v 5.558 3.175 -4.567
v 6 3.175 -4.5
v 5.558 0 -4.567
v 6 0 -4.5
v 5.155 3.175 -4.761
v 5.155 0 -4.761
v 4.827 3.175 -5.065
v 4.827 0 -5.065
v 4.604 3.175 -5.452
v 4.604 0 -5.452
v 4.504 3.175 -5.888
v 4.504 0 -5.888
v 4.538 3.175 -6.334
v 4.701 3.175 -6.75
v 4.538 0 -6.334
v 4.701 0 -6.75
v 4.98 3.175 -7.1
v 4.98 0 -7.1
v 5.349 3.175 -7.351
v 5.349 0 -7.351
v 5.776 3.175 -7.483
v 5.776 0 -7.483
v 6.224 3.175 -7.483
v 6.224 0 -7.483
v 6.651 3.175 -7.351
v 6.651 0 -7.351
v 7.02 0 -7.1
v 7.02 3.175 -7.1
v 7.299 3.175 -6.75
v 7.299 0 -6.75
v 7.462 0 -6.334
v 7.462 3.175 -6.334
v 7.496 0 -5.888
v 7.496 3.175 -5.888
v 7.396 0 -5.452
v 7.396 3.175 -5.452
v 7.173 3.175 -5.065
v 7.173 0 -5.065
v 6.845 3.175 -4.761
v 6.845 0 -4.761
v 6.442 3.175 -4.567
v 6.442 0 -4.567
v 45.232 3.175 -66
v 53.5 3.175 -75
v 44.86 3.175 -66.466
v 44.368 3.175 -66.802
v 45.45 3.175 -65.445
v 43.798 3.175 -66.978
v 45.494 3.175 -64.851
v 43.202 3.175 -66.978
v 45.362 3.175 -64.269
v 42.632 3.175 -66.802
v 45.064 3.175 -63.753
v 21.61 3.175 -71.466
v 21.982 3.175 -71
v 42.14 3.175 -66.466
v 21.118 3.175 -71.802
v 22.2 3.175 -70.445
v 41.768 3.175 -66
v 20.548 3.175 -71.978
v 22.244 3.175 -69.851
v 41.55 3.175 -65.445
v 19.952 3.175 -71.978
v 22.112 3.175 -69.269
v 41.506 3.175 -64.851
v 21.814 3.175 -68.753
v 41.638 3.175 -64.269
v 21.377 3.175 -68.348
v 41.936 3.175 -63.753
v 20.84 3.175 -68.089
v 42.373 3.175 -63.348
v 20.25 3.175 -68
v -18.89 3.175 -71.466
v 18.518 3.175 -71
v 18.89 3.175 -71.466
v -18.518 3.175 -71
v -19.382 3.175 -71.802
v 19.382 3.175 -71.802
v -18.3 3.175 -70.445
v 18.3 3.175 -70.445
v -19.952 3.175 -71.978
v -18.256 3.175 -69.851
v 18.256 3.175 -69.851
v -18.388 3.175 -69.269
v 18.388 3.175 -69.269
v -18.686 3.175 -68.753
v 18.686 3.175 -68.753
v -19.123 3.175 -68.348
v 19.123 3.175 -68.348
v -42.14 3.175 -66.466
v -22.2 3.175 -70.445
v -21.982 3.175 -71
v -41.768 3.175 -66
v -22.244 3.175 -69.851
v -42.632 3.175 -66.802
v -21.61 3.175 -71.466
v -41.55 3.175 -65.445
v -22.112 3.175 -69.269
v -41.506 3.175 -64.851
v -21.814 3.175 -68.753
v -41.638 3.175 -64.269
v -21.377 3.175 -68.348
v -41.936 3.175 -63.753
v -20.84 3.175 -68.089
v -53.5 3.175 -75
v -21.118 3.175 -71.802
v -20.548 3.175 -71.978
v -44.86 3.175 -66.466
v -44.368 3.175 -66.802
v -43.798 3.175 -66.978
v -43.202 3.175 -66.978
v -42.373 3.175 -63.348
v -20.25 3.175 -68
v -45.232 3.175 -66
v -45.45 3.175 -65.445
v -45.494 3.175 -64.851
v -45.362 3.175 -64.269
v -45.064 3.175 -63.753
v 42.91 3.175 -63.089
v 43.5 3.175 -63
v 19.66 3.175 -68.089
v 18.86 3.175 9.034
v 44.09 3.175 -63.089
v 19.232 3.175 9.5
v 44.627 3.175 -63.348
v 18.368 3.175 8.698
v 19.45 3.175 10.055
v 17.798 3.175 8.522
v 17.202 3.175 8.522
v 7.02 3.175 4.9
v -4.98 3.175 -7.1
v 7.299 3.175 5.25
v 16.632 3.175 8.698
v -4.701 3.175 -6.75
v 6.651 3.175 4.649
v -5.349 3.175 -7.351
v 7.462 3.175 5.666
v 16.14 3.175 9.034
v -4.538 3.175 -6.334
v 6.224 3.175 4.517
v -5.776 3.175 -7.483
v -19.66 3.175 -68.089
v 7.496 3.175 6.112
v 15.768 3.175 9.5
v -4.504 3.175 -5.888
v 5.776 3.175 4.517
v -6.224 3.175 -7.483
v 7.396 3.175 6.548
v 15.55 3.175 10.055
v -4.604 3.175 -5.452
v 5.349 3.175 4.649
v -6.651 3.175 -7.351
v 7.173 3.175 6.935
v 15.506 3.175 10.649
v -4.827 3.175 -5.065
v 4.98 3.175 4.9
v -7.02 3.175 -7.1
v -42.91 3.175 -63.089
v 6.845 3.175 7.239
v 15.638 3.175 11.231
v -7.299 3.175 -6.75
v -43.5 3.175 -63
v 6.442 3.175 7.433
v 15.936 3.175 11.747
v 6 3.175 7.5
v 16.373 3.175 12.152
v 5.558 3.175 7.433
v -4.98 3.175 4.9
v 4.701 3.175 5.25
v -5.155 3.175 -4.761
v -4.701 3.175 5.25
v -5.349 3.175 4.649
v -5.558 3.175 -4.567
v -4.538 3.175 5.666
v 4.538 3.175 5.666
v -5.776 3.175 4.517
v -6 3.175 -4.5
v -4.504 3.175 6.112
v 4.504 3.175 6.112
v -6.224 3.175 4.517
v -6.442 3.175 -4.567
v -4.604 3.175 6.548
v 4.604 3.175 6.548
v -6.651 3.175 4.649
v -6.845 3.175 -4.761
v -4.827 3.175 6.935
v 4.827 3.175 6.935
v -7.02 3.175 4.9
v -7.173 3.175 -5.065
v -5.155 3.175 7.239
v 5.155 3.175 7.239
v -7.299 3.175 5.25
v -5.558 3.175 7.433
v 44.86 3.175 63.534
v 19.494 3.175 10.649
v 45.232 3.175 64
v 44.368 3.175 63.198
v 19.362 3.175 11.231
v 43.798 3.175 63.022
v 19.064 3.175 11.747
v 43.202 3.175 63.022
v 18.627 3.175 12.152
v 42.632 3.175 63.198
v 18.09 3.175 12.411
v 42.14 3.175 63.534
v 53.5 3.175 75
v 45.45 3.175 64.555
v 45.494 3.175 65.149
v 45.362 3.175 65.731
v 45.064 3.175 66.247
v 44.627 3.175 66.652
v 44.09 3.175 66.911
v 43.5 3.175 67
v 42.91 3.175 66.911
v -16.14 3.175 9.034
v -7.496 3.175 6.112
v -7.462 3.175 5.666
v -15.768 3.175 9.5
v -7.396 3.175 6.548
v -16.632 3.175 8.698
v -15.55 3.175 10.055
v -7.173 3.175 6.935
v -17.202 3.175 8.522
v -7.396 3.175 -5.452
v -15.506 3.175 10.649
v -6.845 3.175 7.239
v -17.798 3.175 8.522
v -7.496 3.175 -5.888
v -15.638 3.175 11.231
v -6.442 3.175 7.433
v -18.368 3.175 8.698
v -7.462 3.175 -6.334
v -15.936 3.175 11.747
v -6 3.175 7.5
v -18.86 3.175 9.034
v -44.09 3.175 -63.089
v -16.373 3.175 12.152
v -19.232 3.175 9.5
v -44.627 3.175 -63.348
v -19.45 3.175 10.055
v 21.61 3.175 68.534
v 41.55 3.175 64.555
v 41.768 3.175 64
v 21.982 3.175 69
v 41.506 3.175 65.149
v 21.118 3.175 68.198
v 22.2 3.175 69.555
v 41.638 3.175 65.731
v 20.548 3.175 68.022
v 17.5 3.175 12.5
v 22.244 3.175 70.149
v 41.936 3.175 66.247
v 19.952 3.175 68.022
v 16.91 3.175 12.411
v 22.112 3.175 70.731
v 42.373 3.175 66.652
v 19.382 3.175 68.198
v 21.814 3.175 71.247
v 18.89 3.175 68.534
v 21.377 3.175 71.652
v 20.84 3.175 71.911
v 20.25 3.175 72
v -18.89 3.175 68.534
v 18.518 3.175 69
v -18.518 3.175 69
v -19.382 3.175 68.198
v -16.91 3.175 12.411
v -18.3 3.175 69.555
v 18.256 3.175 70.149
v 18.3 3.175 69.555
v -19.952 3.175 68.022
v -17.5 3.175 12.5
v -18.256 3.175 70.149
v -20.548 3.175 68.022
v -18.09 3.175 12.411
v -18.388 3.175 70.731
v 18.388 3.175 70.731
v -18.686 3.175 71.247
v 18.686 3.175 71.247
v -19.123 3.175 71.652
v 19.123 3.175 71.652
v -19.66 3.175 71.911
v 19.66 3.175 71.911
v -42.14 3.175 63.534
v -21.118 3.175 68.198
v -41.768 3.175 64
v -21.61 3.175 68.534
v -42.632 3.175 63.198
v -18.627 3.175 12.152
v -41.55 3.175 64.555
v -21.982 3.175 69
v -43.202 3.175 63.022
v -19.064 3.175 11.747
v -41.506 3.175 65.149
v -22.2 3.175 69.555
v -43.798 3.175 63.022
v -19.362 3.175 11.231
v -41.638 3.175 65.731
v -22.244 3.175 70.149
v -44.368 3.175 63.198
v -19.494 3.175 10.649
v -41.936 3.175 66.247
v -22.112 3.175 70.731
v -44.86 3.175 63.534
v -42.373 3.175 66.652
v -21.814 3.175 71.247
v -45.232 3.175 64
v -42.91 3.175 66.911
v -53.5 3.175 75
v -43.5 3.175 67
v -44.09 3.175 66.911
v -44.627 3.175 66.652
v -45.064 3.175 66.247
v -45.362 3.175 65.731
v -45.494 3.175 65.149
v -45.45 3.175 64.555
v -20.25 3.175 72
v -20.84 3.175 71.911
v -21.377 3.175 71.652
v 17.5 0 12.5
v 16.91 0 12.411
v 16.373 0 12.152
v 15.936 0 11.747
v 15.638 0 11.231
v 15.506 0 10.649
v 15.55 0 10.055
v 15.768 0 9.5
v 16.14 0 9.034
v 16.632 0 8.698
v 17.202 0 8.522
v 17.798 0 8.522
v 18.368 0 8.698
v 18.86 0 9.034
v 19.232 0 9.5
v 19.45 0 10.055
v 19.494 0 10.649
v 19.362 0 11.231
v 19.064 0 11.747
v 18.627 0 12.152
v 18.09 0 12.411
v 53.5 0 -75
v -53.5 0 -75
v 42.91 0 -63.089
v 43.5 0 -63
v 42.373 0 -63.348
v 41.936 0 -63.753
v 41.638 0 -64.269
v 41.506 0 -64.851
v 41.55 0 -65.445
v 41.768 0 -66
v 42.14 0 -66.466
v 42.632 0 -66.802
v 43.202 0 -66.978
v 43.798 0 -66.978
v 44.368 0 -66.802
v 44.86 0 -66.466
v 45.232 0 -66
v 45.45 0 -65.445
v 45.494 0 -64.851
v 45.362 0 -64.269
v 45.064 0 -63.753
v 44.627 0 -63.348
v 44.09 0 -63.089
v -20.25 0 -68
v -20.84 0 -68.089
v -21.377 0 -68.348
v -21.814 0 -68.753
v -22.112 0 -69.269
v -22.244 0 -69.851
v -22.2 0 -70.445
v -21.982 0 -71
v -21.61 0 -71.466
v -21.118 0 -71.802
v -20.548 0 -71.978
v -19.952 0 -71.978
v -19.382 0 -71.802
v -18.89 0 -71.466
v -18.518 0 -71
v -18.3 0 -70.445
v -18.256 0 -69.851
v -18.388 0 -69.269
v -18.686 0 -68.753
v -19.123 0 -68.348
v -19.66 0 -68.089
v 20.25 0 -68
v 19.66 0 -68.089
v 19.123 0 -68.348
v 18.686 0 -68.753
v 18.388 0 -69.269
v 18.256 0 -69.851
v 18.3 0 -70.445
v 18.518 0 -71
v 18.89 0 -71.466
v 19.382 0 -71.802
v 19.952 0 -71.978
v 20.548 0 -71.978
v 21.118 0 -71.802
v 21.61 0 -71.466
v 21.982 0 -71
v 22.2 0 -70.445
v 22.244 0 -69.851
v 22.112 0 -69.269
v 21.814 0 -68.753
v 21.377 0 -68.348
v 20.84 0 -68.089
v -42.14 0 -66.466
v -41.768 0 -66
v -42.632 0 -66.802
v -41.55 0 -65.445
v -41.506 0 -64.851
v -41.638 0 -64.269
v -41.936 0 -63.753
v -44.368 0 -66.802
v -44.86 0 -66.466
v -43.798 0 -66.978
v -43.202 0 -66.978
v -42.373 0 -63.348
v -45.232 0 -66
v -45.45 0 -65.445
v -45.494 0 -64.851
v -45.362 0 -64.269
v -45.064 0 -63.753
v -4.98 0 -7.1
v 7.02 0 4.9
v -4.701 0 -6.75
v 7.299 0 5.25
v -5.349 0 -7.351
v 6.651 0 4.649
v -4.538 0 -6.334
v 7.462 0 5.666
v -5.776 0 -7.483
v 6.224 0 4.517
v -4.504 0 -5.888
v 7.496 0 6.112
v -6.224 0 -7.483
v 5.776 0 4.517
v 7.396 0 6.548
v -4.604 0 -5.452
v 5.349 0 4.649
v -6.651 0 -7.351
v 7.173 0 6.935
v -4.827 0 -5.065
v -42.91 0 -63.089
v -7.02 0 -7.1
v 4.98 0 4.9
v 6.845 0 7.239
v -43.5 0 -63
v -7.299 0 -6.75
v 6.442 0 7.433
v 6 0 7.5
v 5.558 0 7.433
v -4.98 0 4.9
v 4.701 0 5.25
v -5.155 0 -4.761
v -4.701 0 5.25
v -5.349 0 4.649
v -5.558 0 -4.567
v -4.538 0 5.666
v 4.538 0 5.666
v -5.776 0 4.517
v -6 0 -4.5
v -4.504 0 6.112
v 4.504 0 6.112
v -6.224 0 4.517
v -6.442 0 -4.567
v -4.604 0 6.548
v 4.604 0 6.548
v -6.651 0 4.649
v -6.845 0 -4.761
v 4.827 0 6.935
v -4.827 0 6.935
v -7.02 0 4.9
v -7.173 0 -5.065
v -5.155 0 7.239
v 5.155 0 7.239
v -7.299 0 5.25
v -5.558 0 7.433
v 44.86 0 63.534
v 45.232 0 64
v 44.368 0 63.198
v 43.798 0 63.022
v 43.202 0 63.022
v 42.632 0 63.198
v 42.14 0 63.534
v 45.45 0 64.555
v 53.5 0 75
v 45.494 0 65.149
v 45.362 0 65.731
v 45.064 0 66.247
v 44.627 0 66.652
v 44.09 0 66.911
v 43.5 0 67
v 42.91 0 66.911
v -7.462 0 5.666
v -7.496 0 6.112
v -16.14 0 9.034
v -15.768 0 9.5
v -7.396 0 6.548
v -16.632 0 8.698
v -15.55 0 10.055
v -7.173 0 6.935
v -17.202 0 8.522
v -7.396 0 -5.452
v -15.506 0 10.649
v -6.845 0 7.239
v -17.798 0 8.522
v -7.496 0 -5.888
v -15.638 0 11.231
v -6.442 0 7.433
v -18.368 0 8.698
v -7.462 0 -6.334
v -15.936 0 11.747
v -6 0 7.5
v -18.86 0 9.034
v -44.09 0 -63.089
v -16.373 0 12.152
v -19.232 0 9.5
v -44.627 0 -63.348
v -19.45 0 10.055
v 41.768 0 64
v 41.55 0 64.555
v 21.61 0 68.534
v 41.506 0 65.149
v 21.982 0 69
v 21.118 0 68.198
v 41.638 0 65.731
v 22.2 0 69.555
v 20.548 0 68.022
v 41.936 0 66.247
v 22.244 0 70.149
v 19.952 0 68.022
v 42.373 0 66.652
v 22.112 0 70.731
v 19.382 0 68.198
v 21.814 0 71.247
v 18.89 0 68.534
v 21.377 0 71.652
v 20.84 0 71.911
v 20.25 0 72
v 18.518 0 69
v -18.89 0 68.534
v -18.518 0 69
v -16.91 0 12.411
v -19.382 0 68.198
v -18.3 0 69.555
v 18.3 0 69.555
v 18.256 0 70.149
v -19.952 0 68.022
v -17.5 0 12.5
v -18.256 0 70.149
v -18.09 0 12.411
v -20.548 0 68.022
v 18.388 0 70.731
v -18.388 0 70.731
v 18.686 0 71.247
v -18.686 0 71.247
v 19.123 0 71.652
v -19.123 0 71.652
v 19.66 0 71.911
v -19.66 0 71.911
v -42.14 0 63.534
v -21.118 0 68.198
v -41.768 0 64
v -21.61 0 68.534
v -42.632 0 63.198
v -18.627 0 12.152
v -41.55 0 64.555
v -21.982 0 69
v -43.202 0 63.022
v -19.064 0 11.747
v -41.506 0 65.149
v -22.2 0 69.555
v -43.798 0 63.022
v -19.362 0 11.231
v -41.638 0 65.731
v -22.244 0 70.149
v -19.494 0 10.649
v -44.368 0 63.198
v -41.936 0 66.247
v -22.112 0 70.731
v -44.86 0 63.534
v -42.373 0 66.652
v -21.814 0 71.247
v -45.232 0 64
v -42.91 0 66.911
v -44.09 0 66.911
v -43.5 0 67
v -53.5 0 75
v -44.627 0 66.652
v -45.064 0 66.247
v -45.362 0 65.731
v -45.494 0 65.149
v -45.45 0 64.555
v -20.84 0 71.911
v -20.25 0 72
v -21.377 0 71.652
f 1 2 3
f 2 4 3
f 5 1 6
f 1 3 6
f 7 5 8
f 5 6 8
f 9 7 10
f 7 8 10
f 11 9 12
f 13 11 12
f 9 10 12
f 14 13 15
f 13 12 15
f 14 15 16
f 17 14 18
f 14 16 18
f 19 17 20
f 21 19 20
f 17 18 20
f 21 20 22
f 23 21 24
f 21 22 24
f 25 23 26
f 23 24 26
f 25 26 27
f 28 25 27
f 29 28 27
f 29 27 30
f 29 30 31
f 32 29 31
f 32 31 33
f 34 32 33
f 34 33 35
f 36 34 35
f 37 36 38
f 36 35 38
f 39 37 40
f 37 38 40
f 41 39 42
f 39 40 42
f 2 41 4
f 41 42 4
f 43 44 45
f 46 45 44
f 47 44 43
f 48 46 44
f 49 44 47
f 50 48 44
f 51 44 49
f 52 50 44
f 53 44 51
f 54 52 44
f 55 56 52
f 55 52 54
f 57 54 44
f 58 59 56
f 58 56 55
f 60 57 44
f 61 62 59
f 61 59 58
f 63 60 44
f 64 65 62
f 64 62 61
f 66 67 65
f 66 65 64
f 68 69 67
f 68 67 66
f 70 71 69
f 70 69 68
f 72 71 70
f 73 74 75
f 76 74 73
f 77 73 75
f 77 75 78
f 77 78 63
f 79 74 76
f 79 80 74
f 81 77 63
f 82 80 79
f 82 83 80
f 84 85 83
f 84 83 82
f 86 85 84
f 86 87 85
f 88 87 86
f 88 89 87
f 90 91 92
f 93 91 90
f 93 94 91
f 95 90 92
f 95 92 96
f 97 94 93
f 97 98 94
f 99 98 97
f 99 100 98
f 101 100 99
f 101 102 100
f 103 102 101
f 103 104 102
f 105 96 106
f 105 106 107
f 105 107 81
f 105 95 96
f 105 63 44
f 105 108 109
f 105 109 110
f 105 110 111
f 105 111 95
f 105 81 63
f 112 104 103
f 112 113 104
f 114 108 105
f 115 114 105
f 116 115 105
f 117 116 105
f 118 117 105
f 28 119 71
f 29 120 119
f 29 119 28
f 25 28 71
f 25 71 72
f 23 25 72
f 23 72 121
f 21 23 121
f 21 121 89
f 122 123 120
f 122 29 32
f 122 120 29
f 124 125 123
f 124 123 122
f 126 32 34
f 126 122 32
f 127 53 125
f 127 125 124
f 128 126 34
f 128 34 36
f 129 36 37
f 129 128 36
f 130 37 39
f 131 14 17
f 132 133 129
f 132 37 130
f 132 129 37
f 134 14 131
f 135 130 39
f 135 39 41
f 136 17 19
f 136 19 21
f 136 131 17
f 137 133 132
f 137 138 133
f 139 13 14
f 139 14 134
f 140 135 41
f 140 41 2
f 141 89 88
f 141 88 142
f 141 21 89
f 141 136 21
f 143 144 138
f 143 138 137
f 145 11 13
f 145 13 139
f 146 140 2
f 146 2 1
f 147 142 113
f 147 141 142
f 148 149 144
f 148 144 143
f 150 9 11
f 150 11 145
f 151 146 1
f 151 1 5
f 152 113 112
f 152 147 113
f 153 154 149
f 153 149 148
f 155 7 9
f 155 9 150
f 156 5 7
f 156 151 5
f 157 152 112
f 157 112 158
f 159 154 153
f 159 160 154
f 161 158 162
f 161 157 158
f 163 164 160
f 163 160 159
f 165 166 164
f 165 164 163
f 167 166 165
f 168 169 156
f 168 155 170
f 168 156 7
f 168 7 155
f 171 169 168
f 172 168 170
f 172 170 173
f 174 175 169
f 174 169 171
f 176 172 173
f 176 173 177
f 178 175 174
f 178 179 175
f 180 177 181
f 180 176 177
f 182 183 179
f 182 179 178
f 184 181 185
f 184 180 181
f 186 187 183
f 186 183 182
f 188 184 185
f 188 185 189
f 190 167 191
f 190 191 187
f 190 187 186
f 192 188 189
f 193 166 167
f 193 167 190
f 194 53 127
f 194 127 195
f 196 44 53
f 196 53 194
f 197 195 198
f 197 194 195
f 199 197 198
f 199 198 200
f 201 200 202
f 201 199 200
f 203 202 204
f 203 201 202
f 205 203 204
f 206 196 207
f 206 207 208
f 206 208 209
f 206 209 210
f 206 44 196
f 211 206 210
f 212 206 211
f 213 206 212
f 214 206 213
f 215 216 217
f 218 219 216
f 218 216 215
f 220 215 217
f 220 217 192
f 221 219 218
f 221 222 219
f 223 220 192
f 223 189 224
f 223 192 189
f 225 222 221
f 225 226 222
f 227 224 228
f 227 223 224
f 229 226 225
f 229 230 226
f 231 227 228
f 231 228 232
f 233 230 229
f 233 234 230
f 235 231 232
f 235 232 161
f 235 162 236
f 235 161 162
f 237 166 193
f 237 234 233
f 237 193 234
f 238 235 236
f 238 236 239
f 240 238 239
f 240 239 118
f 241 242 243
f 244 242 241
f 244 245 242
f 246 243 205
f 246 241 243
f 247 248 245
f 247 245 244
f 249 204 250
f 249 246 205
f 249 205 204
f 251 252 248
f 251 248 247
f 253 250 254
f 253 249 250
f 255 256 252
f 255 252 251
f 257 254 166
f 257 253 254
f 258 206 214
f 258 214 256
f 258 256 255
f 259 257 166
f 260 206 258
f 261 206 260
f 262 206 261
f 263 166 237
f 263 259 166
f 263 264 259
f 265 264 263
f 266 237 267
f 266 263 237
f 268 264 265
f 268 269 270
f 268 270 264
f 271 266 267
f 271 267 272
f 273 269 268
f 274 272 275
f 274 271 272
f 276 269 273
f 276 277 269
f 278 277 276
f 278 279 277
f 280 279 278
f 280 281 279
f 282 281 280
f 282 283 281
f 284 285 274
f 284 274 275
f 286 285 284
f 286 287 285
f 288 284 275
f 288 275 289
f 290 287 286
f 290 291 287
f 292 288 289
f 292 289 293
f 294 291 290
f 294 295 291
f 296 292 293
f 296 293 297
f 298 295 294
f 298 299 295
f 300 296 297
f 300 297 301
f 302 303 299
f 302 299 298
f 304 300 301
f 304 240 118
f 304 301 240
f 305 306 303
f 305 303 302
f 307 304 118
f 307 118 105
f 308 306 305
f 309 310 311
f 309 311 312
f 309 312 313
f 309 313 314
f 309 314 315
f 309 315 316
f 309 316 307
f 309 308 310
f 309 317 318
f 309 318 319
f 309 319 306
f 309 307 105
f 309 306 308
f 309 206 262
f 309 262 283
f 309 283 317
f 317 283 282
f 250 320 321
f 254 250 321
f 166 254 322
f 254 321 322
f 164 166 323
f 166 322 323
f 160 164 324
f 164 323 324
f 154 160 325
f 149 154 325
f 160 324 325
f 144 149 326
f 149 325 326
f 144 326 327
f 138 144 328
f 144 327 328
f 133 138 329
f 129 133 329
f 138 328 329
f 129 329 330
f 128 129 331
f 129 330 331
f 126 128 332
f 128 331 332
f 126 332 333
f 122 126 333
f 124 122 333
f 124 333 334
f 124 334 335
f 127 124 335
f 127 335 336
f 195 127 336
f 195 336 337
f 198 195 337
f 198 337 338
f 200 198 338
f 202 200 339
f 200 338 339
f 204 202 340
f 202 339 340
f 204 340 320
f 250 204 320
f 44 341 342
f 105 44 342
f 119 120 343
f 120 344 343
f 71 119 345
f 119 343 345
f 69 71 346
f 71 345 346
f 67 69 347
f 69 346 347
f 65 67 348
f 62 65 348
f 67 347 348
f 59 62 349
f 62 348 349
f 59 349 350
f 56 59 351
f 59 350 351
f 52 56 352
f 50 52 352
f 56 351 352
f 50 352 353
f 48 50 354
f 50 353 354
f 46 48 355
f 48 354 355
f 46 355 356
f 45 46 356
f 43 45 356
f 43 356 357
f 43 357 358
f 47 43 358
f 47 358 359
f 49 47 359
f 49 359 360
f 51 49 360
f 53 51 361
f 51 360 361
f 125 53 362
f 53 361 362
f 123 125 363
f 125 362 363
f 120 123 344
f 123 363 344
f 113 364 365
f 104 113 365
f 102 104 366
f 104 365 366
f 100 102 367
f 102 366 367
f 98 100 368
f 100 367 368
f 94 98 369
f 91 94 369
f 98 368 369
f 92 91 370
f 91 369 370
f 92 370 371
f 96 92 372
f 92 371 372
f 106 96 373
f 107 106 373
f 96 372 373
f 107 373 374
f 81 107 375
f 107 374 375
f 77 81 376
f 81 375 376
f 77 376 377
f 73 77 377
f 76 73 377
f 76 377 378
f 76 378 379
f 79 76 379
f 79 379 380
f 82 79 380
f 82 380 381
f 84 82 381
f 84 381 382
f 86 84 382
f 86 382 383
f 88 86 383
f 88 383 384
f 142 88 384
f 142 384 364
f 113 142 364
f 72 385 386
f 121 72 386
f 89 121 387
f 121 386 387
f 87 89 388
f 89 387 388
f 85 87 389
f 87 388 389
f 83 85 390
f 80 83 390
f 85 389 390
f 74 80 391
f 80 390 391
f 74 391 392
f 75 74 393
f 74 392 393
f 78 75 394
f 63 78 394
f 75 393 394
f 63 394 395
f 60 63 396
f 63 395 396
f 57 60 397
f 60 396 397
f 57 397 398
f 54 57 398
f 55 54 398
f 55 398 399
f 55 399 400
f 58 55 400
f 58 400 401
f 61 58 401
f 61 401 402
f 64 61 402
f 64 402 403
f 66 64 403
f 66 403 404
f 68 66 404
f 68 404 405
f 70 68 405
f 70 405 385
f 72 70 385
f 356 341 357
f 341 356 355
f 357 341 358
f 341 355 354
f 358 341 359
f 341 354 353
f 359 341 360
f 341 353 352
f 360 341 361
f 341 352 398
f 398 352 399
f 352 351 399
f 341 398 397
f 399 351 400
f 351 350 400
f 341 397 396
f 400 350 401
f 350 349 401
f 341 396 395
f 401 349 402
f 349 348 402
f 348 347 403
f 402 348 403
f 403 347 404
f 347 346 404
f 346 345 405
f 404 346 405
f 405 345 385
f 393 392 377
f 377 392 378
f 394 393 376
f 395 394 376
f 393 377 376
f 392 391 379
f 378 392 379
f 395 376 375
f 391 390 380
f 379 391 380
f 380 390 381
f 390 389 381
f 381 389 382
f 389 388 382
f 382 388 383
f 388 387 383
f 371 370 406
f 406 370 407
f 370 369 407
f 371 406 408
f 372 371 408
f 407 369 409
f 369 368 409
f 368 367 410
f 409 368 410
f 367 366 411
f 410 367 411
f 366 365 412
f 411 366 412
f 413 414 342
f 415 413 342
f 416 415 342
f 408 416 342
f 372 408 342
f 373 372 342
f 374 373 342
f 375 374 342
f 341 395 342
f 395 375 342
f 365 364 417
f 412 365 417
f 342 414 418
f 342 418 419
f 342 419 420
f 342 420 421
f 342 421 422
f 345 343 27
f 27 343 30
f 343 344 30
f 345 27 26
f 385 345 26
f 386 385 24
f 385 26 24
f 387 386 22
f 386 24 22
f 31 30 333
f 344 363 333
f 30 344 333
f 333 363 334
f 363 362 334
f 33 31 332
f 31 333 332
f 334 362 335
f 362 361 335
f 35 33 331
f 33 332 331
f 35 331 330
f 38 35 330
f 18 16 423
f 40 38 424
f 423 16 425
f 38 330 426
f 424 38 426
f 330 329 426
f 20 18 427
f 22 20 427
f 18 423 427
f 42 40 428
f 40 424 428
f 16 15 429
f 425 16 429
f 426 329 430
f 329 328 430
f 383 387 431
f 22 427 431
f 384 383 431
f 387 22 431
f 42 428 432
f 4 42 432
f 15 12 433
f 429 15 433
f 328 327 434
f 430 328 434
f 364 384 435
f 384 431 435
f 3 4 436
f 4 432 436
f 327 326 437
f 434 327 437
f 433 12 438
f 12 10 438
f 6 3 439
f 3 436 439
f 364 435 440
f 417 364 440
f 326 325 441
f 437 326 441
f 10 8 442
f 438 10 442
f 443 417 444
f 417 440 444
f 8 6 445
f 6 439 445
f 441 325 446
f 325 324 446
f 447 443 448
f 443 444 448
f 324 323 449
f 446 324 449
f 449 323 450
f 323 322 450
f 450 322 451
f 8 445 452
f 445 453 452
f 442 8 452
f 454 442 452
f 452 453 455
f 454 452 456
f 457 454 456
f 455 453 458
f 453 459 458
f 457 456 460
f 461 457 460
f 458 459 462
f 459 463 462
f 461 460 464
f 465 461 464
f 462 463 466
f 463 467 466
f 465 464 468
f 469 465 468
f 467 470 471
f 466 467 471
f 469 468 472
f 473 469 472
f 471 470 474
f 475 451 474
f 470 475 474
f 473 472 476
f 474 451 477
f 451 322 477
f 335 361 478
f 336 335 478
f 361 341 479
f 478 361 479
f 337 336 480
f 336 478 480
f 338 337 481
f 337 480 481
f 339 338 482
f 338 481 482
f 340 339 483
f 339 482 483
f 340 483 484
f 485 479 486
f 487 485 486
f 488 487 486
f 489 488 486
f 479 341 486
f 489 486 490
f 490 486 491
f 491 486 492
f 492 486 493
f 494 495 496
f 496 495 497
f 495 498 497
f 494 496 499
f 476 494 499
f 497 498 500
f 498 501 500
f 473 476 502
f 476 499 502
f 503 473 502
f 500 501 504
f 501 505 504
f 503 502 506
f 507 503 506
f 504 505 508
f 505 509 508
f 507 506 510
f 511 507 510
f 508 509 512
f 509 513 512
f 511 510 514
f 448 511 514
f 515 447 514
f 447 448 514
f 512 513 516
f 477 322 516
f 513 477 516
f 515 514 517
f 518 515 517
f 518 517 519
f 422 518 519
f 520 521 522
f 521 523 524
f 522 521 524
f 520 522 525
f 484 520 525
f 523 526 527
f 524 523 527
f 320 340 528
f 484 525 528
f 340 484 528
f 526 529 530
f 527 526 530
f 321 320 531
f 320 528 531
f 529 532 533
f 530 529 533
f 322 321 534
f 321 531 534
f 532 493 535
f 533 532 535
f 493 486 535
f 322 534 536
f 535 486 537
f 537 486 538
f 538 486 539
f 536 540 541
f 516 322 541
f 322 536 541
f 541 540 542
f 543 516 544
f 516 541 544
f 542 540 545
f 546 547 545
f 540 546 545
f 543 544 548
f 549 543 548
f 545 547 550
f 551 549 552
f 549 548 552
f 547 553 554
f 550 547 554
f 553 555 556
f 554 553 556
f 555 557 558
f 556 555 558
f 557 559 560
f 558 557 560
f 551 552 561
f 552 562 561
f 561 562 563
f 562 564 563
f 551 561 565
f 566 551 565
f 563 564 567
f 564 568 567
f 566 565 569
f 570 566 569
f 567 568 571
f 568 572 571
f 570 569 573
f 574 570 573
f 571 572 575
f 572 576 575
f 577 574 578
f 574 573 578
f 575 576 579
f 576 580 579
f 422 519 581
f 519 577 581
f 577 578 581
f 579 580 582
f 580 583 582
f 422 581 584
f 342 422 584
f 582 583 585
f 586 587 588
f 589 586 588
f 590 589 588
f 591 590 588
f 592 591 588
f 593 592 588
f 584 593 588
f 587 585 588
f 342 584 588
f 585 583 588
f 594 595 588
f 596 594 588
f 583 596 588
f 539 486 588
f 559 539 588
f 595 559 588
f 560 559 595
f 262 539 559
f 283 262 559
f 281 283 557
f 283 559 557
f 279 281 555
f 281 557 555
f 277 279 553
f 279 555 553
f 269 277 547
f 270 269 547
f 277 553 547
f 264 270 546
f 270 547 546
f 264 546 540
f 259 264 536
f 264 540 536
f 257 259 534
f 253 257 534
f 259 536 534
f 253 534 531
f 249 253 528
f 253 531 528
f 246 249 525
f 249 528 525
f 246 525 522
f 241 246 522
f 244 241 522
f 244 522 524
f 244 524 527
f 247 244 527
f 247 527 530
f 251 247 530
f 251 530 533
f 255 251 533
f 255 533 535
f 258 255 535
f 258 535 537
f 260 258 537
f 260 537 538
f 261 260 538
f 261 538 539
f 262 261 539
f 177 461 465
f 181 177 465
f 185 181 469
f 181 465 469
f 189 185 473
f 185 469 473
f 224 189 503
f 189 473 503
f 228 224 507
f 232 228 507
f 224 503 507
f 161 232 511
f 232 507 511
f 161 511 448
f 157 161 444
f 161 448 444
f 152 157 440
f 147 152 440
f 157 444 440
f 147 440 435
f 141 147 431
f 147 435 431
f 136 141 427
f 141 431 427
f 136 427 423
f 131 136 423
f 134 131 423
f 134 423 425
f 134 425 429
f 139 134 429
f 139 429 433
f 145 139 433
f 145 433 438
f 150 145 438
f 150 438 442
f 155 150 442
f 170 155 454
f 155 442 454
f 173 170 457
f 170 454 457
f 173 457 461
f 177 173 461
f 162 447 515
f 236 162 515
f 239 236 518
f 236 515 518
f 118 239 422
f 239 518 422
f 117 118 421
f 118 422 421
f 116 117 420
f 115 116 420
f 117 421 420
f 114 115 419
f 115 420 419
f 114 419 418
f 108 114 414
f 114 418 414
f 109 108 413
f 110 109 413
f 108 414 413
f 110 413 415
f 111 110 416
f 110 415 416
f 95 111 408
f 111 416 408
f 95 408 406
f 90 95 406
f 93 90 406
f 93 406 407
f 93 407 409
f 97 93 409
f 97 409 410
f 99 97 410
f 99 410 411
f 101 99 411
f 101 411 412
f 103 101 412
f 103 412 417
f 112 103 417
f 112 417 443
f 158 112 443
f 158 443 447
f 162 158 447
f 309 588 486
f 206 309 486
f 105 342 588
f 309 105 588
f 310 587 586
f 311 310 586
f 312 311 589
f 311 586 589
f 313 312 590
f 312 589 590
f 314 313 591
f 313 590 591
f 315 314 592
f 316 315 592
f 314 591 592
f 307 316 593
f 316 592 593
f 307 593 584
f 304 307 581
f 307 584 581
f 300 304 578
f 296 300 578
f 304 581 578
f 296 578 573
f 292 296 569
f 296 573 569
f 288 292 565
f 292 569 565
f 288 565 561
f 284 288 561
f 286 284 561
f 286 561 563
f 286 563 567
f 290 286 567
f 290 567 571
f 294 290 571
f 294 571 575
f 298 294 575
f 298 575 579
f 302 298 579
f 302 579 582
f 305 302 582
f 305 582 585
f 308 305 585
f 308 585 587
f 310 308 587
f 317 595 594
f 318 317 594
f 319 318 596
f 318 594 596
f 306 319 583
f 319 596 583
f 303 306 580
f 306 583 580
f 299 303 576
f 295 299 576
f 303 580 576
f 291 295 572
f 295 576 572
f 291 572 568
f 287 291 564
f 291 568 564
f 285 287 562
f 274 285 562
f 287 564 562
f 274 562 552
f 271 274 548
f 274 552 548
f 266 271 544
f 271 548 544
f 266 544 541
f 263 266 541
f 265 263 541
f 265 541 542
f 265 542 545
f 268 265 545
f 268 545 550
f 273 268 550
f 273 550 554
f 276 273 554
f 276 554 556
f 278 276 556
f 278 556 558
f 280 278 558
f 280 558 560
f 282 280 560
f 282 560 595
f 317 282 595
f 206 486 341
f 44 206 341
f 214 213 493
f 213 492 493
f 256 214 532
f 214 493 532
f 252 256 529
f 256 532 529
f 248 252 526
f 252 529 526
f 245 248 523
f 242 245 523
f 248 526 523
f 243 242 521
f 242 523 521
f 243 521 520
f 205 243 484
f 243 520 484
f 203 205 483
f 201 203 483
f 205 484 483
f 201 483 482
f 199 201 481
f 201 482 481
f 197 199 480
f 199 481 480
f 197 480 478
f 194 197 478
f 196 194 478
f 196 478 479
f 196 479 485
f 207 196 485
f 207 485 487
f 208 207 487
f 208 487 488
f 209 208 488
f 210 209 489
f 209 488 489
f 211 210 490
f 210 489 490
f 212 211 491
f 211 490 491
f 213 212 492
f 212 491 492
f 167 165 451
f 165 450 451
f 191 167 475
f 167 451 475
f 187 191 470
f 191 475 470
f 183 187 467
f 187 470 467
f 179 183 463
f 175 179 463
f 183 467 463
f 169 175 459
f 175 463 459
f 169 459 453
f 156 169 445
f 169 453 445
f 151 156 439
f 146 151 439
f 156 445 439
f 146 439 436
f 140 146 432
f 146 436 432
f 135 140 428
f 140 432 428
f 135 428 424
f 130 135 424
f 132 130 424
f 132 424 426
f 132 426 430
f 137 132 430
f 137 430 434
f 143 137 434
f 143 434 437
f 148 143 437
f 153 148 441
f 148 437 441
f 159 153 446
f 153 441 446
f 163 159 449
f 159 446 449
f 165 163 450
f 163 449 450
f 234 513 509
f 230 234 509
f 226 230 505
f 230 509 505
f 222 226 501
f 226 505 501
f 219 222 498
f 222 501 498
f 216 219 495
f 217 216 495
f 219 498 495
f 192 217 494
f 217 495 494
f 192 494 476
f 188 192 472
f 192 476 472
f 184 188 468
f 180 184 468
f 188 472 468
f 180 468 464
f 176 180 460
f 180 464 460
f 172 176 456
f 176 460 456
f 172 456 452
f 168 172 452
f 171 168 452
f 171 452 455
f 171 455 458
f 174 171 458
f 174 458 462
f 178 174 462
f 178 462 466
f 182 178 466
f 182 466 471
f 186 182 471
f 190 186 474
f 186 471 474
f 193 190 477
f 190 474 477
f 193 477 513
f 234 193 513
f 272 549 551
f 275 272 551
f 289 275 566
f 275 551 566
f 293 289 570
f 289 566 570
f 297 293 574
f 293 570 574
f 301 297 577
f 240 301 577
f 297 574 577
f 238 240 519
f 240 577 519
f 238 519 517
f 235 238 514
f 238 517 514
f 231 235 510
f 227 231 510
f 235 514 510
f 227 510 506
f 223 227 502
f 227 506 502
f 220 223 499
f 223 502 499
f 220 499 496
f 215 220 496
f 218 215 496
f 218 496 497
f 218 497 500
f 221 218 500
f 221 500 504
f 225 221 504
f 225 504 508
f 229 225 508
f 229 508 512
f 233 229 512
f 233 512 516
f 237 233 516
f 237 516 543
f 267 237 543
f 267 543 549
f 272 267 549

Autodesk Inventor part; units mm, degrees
ref_plane "YZ Plane" through (0, 0, 0) normal (1, 0, 0) x (0, 1, 0)
ref_plane "XZ Plane" through (0, 0, 0) normal (0, 1, 0) x (-1, 0, 0)
ref_plane "XY Plane" through (0, 0, 0) normal (0, 0, 1) x (1, 0, 0)
sketch "Sketch1" plane through (0, 0, 0) normal (0, 1, 0) x (-1, 0, 0)
  line L0 (53.5, 75) -> (-53.5, 75)
  line L1 (-53.5, 75) -> (-53.5, -75)
  line L2 (-53.5, -75) -> (53.5, -75)
  line L3 (53.5, -75) -> (53.5, 75)
  line L4 (74.9, 0) -> (-74.9, 0) projected
  line L5 (0, -105) -> (0, 105) projected
  point P0 (0, 0)
  point P1 (0, 75)
  point P2 (53.5, 0)
  dimension "d0" = 150
  dimension "d1" = 107
extrude "Extrusion1" add sketch "Sketch1" along normal blind 3.175
sketch "Sketch2" plane through (0, 3.175, 0) normal (0, 1, 0) x (1, 0, 0)
  line L0 (-53.5, -75) -> (53.5, -75) projected
  line L1 (-53.5, 75) -> (-53.5, -75) projected
  line L2 (53.5, 75) -> (-53.5, 75) projected
  line L3 (0, 105) -> (0, -105) projected
  line L4 (-20.25, -70) -> (20.25, -70) construction
  line L5 (20.25, -70) -> (20.25, 70) construction
  line L6 (20.25, 70) -> (-20.25, 70) construction
  line L7 (-20.25, 70) -> (-20.25, -70) construction
  line L8 (-6, -6) -> (6, -6) construction
  line L9 (6, -6) -> (6, 6) construction
  line L10 (6, 6) -> (-6, 6) construction
  line L11 (-6, 6) -> (-6, -6) construction
  line L12 (-43.5, -65) -> (43.5, -65) construction
  line L13 (43.5, -65) -> (43.5, 65) construction
  line L14 (43.5, 65) -> (-43.5, 65) construction
  line L15 (-43.5, 65) -> (-43.5, -65) construction
  line L16 (-17.5, -10.5) -> (17.5, -10.5) construction
  line L17 (-74.9, 0) -> (74.9, 0) projected
  point P0 (0, -10.5)
  point P1 (0, -6)
  point P2 (-6, 0)
  point P3 (0, -65)
  point P4 (-43.5, 0)
  point P5 (-20.25, 0)
  point P6 (0, -70)
  dimension "d31" = 64.5
  dimension "d32" = 12
  dimension "d33" = 12
  dimension "d34" = 35
  dimension "d35" = 10
  dimension "d36" = 10
  dimension "d37" = 5
  dimension "d38" = 40.5
hole "Hole3" at (-43.5, 3.175, 65) at (-20.25, 3.175, 70) at (20.25, 3.175, 70) at (43.5, 3.175, 65) at (43.5, 3.175, -65) at (20.25, 3.175, -70) at (-20.25, 3.175, -70) at (-43.5, 3.175, -65) at (-17.5, 3.175, 10.5) at (17.5, 3.175, 10.5) direction (0, -1, 0) diameter 4 end through all
hole "Hole4" at (-6, 3.175, 6) at (-6, 3.175, -6) at (6, 3.175, 6) at (6, 3.175, -6) direction (0, -1, 0) diameter 3 end through all
equation "\"d36\" = d35"
properties part number "base superior"
